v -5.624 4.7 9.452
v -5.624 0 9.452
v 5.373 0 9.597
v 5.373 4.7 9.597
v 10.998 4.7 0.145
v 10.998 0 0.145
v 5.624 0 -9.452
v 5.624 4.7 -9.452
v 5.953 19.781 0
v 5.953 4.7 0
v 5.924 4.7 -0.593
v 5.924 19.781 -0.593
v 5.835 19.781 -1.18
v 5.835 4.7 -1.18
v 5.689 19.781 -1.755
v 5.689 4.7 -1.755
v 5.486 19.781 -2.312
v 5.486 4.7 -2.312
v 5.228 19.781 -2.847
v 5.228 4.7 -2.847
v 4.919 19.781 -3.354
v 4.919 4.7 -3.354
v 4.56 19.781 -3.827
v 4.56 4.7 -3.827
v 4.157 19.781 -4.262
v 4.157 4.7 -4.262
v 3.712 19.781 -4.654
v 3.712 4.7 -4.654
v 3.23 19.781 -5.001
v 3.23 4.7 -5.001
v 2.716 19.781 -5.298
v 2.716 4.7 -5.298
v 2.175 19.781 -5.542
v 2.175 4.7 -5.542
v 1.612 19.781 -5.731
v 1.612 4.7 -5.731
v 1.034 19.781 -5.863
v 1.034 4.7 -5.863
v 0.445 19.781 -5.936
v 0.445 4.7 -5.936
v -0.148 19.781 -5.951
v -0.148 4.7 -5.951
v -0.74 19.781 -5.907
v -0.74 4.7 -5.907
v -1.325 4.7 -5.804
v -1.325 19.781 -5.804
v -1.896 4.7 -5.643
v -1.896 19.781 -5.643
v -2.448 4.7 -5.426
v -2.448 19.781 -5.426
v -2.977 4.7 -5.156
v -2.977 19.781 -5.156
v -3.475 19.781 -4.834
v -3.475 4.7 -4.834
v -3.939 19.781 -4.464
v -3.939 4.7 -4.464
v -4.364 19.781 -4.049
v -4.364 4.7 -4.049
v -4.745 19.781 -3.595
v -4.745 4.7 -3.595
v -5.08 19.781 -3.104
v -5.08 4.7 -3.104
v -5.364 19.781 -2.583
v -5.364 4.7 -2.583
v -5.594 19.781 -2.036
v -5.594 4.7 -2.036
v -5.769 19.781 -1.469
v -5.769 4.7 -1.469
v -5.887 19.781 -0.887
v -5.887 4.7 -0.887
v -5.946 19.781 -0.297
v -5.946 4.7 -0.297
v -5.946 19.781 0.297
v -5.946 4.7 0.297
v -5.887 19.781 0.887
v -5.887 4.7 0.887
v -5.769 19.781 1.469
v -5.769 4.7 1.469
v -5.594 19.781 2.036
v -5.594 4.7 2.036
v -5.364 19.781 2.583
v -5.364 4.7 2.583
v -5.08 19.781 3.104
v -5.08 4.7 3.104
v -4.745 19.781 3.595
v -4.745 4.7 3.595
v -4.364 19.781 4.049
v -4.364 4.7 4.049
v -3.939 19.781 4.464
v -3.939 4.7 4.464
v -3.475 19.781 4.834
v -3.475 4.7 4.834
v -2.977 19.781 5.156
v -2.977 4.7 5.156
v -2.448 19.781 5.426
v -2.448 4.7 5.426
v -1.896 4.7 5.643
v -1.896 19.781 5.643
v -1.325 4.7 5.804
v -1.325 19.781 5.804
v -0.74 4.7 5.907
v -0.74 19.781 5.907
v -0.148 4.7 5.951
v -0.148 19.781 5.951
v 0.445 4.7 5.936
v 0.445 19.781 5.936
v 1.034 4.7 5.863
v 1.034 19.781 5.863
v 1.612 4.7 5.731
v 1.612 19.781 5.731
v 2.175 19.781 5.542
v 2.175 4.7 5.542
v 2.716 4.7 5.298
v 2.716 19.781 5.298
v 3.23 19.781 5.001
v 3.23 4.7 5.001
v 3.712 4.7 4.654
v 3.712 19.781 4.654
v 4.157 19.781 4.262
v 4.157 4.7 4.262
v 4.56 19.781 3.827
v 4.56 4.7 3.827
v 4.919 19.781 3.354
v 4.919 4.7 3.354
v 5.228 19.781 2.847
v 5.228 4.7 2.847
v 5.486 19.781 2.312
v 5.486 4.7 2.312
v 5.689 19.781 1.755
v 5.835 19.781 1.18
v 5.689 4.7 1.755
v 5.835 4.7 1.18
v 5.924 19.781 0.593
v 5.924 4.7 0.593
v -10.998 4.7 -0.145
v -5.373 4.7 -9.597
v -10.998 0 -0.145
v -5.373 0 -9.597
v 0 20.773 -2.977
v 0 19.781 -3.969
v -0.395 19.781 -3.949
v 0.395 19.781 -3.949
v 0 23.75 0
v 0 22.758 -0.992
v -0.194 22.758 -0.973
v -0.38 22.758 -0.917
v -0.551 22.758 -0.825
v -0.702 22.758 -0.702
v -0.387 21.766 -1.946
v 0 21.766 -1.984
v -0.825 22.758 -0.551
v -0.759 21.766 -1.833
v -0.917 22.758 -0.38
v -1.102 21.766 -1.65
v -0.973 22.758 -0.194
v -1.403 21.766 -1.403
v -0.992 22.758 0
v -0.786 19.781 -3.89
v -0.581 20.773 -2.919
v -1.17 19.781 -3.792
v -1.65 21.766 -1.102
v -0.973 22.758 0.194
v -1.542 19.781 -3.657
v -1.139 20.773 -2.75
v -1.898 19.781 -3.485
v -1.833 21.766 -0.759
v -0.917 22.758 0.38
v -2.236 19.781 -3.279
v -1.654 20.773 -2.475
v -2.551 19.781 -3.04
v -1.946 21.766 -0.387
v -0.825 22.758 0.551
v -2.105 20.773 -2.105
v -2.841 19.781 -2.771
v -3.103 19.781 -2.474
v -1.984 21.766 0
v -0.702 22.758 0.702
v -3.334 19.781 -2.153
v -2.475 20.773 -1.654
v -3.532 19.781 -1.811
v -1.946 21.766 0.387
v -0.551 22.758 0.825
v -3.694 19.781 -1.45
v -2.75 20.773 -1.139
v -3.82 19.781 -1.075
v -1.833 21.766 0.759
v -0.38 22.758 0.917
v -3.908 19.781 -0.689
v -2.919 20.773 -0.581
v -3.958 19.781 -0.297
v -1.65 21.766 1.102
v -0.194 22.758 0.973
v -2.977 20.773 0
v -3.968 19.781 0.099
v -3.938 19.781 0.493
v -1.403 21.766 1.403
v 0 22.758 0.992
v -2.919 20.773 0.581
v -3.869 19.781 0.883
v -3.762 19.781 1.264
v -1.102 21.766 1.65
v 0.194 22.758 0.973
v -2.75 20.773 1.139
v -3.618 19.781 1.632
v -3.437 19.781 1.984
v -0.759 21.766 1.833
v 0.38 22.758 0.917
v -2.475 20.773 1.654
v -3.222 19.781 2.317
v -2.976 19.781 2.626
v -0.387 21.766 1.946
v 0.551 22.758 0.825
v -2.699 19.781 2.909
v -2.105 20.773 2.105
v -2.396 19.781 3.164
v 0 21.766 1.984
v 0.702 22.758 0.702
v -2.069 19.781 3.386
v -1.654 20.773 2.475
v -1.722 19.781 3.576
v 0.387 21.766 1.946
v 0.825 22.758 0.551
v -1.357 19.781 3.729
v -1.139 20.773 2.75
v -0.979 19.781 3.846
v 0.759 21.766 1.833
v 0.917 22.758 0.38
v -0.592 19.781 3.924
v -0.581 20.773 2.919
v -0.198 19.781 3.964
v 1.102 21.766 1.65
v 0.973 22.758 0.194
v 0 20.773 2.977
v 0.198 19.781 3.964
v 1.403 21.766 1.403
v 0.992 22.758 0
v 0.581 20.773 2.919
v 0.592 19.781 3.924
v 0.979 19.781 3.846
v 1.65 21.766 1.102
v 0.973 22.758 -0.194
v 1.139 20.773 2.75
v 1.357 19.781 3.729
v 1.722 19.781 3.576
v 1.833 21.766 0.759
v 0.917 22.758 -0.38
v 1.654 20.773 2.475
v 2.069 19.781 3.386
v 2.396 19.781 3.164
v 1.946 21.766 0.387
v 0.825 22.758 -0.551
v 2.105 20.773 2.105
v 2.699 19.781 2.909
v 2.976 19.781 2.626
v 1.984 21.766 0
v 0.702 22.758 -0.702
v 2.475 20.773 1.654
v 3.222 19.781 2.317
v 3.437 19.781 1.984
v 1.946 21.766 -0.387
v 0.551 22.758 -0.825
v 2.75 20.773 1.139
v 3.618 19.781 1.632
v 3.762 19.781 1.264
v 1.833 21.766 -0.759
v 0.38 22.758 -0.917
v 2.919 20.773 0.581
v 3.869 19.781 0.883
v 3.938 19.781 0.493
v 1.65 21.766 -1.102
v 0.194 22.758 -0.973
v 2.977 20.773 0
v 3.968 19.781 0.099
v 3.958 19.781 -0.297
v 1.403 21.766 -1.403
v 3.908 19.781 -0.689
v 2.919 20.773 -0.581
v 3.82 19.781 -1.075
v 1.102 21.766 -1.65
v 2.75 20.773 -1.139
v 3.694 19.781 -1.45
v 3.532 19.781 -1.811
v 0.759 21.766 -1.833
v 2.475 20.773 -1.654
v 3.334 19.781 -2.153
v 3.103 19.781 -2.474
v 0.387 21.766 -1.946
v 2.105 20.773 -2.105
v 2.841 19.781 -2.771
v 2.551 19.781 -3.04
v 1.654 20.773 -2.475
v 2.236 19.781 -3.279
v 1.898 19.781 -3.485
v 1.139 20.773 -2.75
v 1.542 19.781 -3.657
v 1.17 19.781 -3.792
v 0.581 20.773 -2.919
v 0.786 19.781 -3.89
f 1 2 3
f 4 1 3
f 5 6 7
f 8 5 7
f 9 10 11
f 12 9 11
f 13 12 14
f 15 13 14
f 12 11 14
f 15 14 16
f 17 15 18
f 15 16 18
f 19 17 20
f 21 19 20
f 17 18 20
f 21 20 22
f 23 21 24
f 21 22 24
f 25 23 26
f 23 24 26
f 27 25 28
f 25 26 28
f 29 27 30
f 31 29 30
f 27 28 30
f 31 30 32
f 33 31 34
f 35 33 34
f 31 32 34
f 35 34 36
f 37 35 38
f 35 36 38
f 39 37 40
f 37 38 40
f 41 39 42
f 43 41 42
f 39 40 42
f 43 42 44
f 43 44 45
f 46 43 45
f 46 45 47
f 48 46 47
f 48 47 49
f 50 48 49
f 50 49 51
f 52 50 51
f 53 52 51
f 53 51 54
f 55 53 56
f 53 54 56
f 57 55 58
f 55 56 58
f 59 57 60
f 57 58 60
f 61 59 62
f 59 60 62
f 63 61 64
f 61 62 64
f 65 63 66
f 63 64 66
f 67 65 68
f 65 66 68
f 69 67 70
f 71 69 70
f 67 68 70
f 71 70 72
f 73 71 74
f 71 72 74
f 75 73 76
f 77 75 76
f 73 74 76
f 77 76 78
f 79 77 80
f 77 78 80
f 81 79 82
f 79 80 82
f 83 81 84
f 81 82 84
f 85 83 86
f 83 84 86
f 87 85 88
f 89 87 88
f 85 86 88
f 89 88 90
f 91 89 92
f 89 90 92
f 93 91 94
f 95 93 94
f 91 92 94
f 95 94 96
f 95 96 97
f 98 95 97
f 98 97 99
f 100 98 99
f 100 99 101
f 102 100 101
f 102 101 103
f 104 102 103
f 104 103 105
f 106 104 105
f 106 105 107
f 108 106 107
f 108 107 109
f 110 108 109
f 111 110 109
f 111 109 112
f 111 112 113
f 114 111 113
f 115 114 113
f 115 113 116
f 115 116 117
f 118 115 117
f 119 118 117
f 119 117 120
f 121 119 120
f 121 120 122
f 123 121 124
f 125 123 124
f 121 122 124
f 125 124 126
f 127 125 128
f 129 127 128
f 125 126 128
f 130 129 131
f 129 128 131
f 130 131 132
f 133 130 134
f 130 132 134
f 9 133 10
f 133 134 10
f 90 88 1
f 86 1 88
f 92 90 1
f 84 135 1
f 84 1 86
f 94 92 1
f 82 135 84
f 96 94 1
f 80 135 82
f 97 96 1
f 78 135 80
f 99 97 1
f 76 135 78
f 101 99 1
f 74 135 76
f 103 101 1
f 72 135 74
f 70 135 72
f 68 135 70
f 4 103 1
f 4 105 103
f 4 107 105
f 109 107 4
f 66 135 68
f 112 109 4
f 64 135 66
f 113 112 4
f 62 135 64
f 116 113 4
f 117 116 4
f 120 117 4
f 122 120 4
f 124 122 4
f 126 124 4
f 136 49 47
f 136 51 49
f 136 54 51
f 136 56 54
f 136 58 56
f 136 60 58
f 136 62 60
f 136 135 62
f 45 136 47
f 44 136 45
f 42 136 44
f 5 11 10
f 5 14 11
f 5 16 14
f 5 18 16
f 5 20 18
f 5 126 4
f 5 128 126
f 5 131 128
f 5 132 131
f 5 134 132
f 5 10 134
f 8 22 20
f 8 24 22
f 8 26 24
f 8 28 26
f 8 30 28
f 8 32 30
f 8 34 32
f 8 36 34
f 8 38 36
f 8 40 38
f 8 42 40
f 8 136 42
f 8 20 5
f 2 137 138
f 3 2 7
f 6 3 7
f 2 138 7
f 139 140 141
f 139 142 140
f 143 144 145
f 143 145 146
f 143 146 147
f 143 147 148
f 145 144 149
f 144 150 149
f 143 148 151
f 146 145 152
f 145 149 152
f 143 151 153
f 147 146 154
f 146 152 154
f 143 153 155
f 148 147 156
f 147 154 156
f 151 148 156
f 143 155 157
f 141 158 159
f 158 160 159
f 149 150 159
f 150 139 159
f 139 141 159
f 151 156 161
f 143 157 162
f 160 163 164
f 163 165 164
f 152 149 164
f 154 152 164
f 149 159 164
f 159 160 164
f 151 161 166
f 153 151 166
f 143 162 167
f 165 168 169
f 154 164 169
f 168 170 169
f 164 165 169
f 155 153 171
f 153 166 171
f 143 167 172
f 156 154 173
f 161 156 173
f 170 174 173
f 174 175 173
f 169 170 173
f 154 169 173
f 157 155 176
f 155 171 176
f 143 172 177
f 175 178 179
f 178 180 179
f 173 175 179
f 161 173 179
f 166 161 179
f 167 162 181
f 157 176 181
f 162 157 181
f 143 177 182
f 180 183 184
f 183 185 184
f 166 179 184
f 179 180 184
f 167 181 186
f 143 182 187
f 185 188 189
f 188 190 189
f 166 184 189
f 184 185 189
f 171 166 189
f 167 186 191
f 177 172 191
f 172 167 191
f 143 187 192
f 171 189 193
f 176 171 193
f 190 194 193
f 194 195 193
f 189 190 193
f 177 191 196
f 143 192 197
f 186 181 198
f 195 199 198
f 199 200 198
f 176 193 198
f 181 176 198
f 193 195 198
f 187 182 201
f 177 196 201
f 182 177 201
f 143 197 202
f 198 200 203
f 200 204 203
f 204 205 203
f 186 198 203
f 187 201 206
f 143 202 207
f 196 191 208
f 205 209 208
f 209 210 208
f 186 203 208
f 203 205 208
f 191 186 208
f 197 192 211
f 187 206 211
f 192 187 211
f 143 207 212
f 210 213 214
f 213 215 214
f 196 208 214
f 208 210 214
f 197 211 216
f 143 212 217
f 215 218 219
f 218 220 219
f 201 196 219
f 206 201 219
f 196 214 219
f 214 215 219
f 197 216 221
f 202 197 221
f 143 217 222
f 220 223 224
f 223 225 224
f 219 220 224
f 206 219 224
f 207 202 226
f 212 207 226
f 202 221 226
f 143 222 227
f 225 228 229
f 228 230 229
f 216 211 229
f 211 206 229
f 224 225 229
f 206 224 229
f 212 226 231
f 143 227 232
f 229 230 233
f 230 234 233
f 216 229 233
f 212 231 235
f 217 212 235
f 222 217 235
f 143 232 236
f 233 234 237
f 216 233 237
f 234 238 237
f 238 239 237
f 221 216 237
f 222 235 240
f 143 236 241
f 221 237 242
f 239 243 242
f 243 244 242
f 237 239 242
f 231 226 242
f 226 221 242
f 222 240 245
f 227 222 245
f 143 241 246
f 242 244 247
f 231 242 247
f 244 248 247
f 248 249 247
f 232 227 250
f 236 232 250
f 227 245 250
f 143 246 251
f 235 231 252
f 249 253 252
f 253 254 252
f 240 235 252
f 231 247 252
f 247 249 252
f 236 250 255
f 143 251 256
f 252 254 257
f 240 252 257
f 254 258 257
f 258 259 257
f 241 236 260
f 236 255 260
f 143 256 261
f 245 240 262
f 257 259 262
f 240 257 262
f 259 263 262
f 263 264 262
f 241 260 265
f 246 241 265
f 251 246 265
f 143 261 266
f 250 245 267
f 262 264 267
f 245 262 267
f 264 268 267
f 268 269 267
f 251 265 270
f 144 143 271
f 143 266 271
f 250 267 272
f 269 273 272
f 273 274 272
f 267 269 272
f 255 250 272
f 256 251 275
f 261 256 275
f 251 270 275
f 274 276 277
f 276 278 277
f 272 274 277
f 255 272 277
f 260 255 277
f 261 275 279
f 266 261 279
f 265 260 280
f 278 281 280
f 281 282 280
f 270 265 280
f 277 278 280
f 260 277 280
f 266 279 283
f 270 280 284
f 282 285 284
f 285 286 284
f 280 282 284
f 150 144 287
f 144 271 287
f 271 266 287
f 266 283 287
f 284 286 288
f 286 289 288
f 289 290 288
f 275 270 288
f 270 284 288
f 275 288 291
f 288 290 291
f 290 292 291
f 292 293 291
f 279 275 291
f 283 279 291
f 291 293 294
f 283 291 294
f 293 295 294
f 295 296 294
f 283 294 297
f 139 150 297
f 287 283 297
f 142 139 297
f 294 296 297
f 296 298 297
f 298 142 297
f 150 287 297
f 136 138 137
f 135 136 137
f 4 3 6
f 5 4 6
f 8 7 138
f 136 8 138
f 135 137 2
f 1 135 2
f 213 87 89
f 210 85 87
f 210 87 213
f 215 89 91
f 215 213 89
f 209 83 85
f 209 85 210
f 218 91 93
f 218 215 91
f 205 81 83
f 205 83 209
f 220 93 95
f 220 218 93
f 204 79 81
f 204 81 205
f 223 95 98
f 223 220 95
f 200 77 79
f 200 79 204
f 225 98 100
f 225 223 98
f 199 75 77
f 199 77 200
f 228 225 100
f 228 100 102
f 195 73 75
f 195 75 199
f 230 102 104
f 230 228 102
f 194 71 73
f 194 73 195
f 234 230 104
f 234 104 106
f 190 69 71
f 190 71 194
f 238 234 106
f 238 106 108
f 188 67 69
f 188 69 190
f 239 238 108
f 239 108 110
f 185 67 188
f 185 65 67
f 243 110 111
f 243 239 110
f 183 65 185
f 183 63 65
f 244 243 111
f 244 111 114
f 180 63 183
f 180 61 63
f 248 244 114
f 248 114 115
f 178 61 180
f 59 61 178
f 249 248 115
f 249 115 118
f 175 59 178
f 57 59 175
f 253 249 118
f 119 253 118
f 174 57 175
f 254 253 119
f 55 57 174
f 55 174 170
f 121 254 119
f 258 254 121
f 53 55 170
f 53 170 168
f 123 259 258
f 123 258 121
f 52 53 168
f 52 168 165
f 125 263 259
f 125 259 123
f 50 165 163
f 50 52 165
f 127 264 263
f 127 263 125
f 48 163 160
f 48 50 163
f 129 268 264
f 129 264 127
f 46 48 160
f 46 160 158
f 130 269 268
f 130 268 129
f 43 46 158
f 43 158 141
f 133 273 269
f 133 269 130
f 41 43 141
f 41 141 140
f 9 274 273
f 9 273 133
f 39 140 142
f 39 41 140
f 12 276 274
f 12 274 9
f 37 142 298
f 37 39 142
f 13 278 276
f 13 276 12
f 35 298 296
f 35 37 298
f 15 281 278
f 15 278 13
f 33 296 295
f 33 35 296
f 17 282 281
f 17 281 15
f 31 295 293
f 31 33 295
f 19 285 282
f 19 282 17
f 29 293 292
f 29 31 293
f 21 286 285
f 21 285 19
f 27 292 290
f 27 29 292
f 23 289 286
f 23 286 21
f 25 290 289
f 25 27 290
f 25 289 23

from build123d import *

# Parameters (mm, degrees)
BOSS_EXTRUDE1_DEPTH = 4.7
SKETCH2_R           = 5.953125
BOSS_EXTRUDE2_DEPTH = 15.08125


with BuildPart() as part:
    # Sketch1 → Boss-Extrude1 (new body)
    with BuildSketch(Plane(origin=(0, 0, 0), x_dir=(1, 0, 0), z_dir=(0, 1, 0))):
        Polygon((5.624451566, 9.451615977), (-5.37311376, 9.596725927), (-10.997565326, 0.14510995), (-5.624451566, -9.451615977), (5.37311376, -9.596725927), (10.997565326, -0.14510995), align=None)
    extrude(amount=BOSS_EXTRUDE1_DEPTH)

    # Sketch2 → Boss-Extrude2 (add)
    with BuildSketch(Plane(origin=(0, 4.7, 0), x_dir=(1, 0, 0), z_dir=(0, 1, 0))):
        Circle(SKETCH2_R)
    extrude(amount=BOSS_EXTRUDE2_DEPTH)

    # Sketch4 → Revolve1 (revolve)
    with BuildSketch(Plane(origin=(0, 0, 0), x_dir=(0, 0, -1), z_dir=(1, 0, 0))):
        Polygon((0, 19.78125), (0, 23.75), (3.96875, 19.78125), align=None)
    revolve(axis=Axis((0, 19.78125, 0), (0, 1, 0)))


solid = part.part
